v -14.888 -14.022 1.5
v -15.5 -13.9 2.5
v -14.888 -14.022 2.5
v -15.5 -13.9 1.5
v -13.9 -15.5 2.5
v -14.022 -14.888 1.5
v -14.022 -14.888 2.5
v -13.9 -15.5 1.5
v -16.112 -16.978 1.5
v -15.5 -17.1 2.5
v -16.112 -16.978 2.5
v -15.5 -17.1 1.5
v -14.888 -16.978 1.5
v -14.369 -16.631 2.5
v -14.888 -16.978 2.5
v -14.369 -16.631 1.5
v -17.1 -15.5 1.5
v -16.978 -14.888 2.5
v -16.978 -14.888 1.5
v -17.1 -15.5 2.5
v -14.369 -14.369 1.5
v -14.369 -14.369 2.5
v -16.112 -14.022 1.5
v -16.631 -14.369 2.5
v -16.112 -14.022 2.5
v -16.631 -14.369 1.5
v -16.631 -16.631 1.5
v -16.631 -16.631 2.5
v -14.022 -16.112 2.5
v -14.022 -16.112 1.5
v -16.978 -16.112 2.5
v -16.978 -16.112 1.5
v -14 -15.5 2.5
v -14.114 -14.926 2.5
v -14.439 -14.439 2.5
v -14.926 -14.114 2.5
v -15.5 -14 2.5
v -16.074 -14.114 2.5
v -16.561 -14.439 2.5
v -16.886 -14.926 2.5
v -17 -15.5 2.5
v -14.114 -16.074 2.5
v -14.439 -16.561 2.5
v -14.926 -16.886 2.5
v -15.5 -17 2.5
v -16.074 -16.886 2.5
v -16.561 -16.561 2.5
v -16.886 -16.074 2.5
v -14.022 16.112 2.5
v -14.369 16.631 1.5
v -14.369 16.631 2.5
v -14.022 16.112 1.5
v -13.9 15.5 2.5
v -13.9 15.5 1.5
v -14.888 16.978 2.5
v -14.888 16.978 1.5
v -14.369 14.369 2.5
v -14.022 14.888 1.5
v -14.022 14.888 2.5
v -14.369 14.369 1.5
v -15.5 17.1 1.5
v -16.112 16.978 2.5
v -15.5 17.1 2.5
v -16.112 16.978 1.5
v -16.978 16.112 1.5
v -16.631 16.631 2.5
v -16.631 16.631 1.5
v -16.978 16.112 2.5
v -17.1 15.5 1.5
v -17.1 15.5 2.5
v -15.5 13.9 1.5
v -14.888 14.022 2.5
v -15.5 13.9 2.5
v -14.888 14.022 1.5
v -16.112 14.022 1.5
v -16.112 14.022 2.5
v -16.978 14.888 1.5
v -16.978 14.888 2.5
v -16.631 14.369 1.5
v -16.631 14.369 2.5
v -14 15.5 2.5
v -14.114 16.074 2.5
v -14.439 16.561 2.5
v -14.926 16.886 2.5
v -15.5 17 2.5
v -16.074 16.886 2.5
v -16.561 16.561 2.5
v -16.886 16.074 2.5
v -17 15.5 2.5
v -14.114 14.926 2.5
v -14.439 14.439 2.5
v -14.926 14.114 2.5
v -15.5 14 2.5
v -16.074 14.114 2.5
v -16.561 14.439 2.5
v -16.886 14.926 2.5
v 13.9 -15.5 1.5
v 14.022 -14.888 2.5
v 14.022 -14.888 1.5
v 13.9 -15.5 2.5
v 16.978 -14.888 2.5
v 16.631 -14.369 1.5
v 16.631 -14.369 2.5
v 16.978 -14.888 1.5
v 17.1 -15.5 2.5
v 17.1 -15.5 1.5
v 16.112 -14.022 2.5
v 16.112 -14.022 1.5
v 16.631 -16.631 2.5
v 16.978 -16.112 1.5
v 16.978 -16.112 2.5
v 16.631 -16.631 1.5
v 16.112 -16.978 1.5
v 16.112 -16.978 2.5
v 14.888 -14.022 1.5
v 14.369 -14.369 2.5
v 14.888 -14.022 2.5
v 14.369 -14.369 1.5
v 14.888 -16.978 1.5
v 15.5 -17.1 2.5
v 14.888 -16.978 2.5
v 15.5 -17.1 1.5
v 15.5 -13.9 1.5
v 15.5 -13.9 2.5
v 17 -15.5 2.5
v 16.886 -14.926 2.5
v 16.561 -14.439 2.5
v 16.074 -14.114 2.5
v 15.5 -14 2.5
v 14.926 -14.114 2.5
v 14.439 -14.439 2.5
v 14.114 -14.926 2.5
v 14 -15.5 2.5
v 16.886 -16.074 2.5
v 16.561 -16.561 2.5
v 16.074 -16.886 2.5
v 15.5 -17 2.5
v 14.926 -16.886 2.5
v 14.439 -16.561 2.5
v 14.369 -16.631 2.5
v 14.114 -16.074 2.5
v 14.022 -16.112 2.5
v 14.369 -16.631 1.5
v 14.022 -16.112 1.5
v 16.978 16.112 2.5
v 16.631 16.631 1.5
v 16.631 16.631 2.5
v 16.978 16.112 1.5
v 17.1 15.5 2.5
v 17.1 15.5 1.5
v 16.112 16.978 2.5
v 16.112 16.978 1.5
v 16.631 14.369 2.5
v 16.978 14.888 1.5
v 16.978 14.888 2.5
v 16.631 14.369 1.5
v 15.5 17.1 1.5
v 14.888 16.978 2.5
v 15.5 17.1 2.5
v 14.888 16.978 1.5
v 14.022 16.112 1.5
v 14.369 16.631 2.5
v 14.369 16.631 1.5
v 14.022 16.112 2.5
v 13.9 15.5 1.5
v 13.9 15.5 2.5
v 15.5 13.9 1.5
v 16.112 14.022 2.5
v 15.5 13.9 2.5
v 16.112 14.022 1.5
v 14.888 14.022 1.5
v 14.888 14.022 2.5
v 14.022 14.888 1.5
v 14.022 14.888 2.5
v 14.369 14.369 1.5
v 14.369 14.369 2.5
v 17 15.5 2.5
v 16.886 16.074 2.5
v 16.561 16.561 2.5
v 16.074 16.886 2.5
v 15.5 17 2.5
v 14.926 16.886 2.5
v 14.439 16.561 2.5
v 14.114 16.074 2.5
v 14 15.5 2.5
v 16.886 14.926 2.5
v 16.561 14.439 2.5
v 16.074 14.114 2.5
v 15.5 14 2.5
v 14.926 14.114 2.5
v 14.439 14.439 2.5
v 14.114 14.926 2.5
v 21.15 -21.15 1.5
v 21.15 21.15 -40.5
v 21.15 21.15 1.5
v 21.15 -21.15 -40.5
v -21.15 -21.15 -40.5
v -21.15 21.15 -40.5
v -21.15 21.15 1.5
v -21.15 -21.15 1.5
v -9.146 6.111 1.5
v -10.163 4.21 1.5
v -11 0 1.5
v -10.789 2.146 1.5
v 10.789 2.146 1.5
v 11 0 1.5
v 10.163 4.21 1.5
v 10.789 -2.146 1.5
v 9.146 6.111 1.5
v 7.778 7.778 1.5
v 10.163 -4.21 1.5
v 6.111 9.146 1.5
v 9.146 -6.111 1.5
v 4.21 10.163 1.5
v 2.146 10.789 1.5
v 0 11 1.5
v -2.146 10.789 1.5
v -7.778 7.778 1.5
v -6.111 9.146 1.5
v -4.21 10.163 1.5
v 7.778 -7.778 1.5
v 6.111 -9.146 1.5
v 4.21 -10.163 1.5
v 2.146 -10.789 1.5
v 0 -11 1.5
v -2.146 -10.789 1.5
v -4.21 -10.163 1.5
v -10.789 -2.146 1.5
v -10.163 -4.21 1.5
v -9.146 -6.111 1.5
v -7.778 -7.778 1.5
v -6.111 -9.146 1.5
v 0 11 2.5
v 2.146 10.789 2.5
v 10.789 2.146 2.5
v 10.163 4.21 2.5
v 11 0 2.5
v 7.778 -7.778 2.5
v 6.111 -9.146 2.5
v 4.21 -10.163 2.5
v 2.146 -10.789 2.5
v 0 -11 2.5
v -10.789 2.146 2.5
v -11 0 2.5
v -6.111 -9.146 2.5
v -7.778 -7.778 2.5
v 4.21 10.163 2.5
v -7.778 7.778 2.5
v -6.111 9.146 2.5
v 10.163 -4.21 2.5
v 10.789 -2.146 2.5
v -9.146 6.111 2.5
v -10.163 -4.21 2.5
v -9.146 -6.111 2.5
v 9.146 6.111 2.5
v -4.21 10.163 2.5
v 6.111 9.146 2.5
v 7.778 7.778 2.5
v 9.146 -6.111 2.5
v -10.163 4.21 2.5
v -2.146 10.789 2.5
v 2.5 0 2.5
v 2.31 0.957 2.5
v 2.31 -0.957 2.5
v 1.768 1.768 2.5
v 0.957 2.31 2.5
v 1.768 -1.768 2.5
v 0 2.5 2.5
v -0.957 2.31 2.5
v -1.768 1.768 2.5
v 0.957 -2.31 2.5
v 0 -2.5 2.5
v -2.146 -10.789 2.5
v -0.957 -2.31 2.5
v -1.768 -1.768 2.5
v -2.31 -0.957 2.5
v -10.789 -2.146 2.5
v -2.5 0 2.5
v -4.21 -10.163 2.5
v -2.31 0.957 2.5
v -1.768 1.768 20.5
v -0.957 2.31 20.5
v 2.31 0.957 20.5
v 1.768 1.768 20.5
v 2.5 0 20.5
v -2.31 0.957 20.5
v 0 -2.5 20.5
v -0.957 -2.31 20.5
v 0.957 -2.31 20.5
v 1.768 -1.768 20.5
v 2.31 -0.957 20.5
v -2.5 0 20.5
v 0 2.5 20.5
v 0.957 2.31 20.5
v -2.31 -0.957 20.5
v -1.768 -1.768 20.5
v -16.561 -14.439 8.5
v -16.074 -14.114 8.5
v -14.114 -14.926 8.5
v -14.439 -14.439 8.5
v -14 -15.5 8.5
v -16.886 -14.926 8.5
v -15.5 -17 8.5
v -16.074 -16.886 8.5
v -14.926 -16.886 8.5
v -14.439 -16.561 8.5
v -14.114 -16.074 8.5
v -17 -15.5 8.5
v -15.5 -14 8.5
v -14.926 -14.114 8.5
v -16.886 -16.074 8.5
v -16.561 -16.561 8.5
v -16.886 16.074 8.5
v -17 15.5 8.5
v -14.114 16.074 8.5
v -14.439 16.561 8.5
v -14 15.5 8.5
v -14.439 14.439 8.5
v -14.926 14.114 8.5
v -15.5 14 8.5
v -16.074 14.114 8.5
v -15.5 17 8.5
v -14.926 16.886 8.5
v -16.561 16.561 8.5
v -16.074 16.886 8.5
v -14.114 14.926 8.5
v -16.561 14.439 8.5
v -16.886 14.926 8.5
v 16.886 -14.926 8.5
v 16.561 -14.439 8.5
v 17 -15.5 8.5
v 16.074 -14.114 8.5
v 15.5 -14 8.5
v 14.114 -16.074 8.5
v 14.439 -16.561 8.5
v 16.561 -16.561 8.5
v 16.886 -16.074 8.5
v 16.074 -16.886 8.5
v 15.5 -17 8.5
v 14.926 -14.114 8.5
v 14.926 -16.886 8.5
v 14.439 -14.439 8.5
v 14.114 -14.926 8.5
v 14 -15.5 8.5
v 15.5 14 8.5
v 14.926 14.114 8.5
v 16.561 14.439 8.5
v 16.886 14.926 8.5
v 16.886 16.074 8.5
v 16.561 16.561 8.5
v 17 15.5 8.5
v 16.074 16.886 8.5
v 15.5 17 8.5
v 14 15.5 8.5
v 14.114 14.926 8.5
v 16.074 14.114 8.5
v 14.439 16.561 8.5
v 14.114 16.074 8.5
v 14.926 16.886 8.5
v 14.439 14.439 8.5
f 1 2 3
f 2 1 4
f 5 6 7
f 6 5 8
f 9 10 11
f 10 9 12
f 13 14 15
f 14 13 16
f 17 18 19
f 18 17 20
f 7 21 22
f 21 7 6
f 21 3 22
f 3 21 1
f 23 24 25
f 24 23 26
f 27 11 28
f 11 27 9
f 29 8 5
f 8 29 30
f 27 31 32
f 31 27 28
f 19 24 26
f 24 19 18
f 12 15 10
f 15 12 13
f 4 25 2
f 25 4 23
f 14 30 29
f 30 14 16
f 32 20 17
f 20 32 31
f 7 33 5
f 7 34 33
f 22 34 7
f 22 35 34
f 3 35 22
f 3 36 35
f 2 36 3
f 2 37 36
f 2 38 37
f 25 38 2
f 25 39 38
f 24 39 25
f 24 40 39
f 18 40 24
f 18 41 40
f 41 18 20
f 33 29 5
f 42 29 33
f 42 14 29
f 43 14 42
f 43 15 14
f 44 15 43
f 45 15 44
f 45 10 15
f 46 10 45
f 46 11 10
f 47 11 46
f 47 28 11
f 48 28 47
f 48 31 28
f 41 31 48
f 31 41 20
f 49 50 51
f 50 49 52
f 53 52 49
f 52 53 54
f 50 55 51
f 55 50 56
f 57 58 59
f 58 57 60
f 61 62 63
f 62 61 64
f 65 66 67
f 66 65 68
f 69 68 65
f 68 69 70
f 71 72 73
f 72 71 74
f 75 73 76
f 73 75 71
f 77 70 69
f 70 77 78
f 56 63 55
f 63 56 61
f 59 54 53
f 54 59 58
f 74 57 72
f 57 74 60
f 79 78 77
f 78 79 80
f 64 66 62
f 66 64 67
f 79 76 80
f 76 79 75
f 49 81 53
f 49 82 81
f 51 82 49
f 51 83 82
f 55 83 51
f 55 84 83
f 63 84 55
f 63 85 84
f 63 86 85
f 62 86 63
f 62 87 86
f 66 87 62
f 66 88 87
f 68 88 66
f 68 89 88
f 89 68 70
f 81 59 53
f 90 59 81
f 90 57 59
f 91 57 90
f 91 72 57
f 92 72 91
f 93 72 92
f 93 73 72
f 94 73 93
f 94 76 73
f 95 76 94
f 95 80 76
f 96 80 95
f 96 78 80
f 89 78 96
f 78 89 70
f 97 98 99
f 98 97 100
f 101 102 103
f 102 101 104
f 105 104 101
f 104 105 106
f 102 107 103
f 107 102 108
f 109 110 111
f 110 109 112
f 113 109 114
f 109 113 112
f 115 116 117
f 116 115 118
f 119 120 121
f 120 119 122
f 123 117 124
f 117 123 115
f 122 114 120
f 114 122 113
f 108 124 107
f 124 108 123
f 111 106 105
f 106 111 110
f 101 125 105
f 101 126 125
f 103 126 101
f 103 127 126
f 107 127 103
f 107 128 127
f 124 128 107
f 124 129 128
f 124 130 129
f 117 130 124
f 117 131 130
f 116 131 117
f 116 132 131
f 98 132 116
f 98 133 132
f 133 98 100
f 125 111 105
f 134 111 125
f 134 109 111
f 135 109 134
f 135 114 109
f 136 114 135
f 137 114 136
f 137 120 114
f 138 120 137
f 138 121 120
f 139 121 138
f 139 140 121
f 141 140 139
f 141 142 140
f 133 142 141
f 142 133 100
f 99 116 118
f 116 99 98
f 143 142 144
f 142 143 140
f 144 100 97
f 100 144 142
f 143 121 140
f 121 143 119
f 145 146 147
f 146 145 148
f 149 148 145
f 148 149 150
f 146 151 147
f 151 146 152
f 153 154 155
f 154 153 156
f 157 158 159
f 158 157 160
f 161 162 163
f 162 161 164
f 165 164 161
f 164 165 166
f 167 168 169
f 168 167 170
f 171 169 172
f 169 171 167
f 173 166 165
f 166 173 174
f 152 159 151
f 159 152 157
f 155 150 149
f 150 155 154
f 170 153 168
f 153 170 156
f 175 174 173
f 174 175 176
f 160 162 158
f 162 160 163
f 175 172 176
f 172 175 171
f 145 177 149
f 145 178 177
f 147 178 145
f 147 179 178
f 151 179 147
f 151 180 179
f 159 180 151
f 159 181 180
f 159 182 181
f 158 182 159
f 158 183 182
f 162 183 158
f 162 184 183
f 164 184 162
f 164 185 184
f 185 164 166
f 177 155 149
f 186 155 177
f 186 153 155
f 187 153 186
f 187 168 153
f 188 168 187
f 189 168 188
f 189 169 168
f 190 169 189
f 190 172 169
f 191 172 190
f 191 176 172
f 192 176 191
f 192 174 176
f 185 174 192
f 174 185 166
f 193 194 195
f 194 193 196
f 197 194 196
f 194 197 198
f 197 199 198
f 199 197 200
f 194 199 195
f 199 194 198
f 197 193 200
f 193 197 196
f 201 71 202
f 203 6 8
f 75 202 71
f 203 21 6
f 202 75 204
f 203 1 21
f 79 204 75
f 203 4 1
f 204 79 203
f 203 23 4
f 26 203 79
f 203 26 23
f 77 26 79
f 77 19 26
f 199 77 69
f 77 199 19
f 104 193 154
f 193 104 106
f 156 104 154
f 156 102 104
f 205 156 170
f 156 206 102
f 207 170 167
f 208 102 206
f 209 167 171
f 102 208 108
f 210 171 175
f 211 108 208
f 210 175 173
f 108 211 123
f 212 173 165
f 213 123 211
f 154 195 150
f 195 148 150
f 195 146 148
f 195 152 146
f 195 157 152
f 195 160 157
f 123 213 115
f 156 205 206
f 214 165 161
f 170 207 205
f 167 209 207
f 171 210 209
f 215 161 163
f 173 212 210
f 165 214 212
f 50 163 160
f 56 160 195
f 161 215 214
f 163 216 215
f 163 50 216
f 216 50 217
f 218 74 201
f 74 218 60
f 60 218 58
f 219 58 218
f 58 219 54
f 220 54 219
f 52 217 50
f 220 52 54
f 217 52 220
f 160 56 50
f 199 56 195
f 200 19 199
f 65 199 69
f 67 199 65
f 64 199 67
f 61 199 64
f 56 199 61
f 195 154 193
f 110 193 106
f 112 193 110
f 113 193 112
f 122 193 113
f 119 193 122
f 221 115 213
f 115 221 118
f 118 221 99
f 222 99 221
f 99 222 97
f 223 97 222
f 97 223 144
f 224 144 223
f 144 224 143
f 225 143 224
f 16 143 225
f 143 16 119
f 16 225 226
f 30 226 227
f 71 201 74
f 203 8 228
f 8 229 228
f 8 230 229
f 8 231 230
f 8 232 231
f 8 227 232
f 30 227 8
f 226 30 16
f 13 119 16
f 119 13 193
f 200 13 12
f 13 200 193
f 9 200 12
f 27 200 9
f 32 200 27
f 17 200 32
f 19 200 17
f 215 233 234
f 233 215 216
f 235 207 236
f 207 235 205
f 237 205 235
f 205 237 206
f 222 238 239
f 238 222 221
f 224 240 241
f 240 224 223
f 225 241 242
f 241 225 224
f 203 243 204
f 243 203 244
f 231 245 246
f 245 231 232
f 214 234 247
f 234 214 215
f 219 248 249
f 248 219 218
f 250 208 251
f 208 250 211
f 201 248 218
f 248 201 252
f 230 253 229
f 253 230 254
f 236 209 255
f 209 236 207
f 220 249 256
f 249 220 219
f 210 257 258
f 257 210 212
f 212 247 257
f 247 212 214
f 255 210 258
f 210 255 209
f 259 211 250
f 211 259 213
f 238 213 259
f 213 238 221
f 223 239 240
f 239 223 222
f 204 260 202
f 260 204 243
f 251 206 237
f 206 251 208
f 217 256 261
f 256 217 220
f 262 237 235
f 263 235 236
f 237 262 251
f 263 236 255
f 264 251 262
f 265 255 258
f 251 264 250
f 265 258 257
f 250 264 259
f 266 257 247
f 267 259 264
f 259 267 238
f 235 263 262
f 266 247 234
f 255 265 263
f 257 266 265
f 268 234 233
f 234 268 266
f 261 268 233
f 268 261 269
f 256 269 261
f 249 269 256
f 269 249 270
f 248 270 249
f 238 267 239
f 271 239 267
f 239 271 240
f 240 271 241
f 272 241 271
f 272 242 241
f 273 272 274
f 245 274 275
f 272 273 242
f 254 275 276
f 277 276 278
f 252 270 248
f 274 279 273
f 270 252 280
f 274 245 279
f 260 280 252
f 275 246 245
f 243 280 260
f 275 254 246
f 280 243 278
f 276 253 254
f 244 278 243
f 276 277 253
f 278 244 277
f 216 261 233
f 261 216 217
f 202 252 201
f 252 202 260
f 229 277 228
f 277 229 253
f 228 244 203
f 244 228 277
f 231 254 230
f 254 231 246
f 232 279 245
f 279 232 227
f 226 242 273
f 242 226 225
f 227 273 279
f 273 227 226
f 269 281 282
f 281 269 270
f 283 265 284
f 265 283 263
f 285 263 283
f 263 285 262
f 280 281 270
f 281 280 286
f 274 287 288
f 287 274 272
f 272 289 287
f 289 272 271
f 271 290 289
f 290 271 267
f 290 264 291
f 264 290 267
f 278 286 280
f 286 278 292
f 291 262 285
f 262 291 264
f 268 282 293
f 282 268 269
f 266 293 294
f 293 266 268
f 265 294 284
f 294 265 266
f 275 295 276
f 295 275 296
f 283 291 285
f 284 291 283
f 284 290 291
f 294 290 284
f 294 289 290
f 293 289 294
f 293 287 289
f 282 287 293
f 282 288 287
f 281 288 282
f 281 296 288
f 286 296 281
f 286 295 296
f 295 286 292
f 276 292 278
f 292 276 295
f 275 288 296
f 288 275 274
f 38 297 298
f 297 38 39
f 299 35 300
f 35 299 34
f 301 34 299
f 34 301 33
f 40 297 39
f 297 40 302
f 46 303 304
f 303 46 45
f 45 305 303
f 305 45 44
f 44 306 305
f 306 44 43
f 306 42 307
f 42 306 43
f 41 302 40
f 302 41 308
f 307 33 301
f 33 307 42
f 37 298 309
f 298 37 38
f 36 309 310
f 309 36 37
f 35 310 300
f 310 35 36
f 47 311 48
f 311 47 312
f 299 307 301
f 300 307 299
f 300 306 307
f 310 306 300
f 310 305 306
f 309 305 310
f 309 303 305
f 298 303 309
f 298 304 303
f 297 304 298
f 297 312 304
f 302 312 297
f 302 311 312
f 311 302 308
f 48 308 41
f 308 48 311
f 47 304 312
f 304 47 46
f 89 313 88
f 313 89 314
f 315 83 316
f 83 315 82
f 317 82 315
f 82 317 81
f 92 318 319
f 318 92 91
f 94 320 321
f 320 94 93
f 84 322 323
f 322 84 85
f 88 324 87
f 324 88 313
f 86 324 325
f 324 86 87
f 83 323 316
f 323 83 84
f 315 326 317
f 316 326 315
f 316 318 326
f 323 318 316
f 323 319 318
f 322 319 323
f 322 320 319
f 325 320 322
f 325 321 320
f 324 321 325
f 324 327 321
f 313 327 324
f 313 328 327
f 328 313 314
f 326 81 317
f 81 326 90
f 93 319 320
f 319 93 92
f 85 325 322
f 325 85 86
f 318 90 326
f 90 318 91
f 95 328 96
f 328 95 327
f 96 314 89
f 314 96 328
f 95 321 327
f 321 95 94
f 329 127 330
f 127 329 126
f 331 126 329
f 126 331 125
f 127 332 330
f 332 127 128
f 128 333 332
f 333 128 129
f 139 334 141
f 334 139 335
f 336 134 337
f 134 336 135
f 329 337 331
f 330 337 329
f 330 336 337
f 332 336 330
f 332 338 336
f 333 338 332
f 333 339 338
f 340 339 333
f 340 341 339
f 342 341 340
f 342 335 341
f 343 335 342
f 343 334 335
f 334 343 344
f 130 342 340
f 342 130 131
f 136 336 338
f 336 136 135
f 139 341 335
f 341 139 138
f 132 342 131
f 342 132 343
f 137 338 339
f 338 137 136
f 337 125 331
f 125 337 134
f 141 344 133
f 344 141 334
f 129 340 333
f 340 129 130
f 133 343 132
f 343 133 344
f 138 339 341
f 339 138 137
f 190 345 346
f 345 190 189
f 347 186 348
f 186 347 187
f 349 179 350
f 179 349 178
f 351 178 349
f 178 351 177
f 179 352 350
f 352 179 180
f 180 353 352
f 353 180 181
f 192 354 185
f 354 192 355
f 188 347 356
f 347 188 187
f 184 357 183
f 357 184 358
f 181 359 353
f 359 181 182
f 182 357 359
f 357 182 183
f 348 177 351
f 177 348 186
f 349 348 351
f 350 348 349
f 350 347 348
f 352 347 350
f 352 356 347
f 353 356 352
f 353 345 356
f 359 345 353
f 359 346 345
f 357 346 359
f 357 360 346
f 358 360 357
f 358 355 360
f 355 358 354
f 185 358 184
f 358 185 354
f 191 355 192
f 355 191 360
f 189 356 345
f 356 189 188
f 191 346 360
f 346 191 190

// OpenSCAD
// Parameters
face_width = 42.3; //[21.15:84.6:0.1]
face_thickness = 3.0; //[1.5:6.0:0.1]
body_length = 40.0; //[20.0:80.0:0.1]
body_width = 42.3; //[21.15:84.6:0.1]
shaft_diameter = 5.0; //[2.5:10.0:0.1]
shaft_length = 20.0; //[10.0:40.0:0.1]
shaft_boss_diameter = 22.0; //[11.0:44.0:0.1]
shaft_boss_height = 2.0; //[1.0:5.0:0.1]
mount_hole_spacing = 31.0; //[15.5:62.0:0.1]
mount_hole_diameter = 3.2; //[2.0:6.0:0.1]
hole_through_extra = 2.0; //[1.0:6.0:0.1]
overlap = 1.0; //[0.5:2.0:0.1]
screw_shank_diameter = 3.0; //[2.0:6.0:0.1]
screw_length = 8.0; //[4.0:20.0:0.1]
washer_outer_diameter = 7.0; //[4.0:14.0:0.1]
washer_thickness = 1.0; //[0.5:3.0:0.1]

// NEMA motor - complete geometry
module NEMA() {
  color("Black") {
    // Body
    translate([0, 0, -(face_thickness/2 + body_length/2 - overlap)])
      cube([body_width, body_width, body_length], center=true);
    // Front face
    translate([0, 0, 0])
      cube([face_width, face_width, face_thickness], center=true);
    // Shaft boss
    translate([0, 0, face_thickness/2 + shaft_boss_height/2 - overlap])
      cylinder(d=shaft_boss_diameter, h=shaft_boss_height, center=true, $fn=32);
    // Shaft
    color("Silver")
    translate([0, 0, face_thickness/2 + shaft_length/2 - overlap])
      cylinder(d=shaft_diameter, h=shaft_length, center=true, $fn=16);
    // Mounting holes
    color("DimGray")
    for (x = [-1, 1], y = [-1, 1])
      translate([x * mount_hole_spacing/2, y * mount_hole_spacing/2, 0])
        cylinder(d=mount_hole_diameter, h=face_thickness + hole_through_extra, center=true, $fn=16);
  }
}

// Motor shaft - detailed geometry
module motor_shaft() {
  color("Silver")
  translate([0, 0, face_thickness/2 + shaft_length/2 - overlap])
    cylinder(d=shaft_diameter, h=shaft_length, center=true, $fn=16);
}

// Screw and washer - detailed geometry
module screw_and_washer() {
  color("DimGray")
  for (x = [-1, 1], y = [-1, 1]) {
    // Screw shank
    translate([x * mount_hole_spacing/2, y * mount_hole_spacing/2, face_thickness/2 + screw_length/2 - overlap])
      cylinder(d=screw_shank_diameter, h=screw_length, center=true, $fn=16);
    // Washer
    translate([x * mount_hole_spacing/2, y * mount_hole_spacing/2, face_thickness/2 + washer_thickness/2 - overlap])
      cylinder(d=washer_outer_diameter, h=washer_thickness, center=true, $fn=16);
  }
}

// Grill hole positions - placeholder geometry
module grill_hole_positions() {
  // Placeholder for grill hole positions
  color("Gray")
  translate([0, 0, 0])
    cube([20, 20, face_thickness], center=true);
}

// D Plug D - placeholder geometry
module d_plug_D() {
  // Placeholder for D Plug D
  color("Gray")
  translate([0, 0, 0])
    cube([10, 10, face_thickness], center=true);
}

// Ttrack hole positions - placeholder geometry
module ttrack_hole_positions() {
  // Placeholder for Ttrack hole positions
  color("Gray")
  translate([0, 0, 0])
    cube([face_width, face_width, face_thickness], center=true);
}

// Assembly
module assembly() {
  NEMA();
  motor_shaft();
  screw_and_washer();
  grill_hole_positions();
  d_plug_D();
  ttrack_hole_positions();
}

assembly();
